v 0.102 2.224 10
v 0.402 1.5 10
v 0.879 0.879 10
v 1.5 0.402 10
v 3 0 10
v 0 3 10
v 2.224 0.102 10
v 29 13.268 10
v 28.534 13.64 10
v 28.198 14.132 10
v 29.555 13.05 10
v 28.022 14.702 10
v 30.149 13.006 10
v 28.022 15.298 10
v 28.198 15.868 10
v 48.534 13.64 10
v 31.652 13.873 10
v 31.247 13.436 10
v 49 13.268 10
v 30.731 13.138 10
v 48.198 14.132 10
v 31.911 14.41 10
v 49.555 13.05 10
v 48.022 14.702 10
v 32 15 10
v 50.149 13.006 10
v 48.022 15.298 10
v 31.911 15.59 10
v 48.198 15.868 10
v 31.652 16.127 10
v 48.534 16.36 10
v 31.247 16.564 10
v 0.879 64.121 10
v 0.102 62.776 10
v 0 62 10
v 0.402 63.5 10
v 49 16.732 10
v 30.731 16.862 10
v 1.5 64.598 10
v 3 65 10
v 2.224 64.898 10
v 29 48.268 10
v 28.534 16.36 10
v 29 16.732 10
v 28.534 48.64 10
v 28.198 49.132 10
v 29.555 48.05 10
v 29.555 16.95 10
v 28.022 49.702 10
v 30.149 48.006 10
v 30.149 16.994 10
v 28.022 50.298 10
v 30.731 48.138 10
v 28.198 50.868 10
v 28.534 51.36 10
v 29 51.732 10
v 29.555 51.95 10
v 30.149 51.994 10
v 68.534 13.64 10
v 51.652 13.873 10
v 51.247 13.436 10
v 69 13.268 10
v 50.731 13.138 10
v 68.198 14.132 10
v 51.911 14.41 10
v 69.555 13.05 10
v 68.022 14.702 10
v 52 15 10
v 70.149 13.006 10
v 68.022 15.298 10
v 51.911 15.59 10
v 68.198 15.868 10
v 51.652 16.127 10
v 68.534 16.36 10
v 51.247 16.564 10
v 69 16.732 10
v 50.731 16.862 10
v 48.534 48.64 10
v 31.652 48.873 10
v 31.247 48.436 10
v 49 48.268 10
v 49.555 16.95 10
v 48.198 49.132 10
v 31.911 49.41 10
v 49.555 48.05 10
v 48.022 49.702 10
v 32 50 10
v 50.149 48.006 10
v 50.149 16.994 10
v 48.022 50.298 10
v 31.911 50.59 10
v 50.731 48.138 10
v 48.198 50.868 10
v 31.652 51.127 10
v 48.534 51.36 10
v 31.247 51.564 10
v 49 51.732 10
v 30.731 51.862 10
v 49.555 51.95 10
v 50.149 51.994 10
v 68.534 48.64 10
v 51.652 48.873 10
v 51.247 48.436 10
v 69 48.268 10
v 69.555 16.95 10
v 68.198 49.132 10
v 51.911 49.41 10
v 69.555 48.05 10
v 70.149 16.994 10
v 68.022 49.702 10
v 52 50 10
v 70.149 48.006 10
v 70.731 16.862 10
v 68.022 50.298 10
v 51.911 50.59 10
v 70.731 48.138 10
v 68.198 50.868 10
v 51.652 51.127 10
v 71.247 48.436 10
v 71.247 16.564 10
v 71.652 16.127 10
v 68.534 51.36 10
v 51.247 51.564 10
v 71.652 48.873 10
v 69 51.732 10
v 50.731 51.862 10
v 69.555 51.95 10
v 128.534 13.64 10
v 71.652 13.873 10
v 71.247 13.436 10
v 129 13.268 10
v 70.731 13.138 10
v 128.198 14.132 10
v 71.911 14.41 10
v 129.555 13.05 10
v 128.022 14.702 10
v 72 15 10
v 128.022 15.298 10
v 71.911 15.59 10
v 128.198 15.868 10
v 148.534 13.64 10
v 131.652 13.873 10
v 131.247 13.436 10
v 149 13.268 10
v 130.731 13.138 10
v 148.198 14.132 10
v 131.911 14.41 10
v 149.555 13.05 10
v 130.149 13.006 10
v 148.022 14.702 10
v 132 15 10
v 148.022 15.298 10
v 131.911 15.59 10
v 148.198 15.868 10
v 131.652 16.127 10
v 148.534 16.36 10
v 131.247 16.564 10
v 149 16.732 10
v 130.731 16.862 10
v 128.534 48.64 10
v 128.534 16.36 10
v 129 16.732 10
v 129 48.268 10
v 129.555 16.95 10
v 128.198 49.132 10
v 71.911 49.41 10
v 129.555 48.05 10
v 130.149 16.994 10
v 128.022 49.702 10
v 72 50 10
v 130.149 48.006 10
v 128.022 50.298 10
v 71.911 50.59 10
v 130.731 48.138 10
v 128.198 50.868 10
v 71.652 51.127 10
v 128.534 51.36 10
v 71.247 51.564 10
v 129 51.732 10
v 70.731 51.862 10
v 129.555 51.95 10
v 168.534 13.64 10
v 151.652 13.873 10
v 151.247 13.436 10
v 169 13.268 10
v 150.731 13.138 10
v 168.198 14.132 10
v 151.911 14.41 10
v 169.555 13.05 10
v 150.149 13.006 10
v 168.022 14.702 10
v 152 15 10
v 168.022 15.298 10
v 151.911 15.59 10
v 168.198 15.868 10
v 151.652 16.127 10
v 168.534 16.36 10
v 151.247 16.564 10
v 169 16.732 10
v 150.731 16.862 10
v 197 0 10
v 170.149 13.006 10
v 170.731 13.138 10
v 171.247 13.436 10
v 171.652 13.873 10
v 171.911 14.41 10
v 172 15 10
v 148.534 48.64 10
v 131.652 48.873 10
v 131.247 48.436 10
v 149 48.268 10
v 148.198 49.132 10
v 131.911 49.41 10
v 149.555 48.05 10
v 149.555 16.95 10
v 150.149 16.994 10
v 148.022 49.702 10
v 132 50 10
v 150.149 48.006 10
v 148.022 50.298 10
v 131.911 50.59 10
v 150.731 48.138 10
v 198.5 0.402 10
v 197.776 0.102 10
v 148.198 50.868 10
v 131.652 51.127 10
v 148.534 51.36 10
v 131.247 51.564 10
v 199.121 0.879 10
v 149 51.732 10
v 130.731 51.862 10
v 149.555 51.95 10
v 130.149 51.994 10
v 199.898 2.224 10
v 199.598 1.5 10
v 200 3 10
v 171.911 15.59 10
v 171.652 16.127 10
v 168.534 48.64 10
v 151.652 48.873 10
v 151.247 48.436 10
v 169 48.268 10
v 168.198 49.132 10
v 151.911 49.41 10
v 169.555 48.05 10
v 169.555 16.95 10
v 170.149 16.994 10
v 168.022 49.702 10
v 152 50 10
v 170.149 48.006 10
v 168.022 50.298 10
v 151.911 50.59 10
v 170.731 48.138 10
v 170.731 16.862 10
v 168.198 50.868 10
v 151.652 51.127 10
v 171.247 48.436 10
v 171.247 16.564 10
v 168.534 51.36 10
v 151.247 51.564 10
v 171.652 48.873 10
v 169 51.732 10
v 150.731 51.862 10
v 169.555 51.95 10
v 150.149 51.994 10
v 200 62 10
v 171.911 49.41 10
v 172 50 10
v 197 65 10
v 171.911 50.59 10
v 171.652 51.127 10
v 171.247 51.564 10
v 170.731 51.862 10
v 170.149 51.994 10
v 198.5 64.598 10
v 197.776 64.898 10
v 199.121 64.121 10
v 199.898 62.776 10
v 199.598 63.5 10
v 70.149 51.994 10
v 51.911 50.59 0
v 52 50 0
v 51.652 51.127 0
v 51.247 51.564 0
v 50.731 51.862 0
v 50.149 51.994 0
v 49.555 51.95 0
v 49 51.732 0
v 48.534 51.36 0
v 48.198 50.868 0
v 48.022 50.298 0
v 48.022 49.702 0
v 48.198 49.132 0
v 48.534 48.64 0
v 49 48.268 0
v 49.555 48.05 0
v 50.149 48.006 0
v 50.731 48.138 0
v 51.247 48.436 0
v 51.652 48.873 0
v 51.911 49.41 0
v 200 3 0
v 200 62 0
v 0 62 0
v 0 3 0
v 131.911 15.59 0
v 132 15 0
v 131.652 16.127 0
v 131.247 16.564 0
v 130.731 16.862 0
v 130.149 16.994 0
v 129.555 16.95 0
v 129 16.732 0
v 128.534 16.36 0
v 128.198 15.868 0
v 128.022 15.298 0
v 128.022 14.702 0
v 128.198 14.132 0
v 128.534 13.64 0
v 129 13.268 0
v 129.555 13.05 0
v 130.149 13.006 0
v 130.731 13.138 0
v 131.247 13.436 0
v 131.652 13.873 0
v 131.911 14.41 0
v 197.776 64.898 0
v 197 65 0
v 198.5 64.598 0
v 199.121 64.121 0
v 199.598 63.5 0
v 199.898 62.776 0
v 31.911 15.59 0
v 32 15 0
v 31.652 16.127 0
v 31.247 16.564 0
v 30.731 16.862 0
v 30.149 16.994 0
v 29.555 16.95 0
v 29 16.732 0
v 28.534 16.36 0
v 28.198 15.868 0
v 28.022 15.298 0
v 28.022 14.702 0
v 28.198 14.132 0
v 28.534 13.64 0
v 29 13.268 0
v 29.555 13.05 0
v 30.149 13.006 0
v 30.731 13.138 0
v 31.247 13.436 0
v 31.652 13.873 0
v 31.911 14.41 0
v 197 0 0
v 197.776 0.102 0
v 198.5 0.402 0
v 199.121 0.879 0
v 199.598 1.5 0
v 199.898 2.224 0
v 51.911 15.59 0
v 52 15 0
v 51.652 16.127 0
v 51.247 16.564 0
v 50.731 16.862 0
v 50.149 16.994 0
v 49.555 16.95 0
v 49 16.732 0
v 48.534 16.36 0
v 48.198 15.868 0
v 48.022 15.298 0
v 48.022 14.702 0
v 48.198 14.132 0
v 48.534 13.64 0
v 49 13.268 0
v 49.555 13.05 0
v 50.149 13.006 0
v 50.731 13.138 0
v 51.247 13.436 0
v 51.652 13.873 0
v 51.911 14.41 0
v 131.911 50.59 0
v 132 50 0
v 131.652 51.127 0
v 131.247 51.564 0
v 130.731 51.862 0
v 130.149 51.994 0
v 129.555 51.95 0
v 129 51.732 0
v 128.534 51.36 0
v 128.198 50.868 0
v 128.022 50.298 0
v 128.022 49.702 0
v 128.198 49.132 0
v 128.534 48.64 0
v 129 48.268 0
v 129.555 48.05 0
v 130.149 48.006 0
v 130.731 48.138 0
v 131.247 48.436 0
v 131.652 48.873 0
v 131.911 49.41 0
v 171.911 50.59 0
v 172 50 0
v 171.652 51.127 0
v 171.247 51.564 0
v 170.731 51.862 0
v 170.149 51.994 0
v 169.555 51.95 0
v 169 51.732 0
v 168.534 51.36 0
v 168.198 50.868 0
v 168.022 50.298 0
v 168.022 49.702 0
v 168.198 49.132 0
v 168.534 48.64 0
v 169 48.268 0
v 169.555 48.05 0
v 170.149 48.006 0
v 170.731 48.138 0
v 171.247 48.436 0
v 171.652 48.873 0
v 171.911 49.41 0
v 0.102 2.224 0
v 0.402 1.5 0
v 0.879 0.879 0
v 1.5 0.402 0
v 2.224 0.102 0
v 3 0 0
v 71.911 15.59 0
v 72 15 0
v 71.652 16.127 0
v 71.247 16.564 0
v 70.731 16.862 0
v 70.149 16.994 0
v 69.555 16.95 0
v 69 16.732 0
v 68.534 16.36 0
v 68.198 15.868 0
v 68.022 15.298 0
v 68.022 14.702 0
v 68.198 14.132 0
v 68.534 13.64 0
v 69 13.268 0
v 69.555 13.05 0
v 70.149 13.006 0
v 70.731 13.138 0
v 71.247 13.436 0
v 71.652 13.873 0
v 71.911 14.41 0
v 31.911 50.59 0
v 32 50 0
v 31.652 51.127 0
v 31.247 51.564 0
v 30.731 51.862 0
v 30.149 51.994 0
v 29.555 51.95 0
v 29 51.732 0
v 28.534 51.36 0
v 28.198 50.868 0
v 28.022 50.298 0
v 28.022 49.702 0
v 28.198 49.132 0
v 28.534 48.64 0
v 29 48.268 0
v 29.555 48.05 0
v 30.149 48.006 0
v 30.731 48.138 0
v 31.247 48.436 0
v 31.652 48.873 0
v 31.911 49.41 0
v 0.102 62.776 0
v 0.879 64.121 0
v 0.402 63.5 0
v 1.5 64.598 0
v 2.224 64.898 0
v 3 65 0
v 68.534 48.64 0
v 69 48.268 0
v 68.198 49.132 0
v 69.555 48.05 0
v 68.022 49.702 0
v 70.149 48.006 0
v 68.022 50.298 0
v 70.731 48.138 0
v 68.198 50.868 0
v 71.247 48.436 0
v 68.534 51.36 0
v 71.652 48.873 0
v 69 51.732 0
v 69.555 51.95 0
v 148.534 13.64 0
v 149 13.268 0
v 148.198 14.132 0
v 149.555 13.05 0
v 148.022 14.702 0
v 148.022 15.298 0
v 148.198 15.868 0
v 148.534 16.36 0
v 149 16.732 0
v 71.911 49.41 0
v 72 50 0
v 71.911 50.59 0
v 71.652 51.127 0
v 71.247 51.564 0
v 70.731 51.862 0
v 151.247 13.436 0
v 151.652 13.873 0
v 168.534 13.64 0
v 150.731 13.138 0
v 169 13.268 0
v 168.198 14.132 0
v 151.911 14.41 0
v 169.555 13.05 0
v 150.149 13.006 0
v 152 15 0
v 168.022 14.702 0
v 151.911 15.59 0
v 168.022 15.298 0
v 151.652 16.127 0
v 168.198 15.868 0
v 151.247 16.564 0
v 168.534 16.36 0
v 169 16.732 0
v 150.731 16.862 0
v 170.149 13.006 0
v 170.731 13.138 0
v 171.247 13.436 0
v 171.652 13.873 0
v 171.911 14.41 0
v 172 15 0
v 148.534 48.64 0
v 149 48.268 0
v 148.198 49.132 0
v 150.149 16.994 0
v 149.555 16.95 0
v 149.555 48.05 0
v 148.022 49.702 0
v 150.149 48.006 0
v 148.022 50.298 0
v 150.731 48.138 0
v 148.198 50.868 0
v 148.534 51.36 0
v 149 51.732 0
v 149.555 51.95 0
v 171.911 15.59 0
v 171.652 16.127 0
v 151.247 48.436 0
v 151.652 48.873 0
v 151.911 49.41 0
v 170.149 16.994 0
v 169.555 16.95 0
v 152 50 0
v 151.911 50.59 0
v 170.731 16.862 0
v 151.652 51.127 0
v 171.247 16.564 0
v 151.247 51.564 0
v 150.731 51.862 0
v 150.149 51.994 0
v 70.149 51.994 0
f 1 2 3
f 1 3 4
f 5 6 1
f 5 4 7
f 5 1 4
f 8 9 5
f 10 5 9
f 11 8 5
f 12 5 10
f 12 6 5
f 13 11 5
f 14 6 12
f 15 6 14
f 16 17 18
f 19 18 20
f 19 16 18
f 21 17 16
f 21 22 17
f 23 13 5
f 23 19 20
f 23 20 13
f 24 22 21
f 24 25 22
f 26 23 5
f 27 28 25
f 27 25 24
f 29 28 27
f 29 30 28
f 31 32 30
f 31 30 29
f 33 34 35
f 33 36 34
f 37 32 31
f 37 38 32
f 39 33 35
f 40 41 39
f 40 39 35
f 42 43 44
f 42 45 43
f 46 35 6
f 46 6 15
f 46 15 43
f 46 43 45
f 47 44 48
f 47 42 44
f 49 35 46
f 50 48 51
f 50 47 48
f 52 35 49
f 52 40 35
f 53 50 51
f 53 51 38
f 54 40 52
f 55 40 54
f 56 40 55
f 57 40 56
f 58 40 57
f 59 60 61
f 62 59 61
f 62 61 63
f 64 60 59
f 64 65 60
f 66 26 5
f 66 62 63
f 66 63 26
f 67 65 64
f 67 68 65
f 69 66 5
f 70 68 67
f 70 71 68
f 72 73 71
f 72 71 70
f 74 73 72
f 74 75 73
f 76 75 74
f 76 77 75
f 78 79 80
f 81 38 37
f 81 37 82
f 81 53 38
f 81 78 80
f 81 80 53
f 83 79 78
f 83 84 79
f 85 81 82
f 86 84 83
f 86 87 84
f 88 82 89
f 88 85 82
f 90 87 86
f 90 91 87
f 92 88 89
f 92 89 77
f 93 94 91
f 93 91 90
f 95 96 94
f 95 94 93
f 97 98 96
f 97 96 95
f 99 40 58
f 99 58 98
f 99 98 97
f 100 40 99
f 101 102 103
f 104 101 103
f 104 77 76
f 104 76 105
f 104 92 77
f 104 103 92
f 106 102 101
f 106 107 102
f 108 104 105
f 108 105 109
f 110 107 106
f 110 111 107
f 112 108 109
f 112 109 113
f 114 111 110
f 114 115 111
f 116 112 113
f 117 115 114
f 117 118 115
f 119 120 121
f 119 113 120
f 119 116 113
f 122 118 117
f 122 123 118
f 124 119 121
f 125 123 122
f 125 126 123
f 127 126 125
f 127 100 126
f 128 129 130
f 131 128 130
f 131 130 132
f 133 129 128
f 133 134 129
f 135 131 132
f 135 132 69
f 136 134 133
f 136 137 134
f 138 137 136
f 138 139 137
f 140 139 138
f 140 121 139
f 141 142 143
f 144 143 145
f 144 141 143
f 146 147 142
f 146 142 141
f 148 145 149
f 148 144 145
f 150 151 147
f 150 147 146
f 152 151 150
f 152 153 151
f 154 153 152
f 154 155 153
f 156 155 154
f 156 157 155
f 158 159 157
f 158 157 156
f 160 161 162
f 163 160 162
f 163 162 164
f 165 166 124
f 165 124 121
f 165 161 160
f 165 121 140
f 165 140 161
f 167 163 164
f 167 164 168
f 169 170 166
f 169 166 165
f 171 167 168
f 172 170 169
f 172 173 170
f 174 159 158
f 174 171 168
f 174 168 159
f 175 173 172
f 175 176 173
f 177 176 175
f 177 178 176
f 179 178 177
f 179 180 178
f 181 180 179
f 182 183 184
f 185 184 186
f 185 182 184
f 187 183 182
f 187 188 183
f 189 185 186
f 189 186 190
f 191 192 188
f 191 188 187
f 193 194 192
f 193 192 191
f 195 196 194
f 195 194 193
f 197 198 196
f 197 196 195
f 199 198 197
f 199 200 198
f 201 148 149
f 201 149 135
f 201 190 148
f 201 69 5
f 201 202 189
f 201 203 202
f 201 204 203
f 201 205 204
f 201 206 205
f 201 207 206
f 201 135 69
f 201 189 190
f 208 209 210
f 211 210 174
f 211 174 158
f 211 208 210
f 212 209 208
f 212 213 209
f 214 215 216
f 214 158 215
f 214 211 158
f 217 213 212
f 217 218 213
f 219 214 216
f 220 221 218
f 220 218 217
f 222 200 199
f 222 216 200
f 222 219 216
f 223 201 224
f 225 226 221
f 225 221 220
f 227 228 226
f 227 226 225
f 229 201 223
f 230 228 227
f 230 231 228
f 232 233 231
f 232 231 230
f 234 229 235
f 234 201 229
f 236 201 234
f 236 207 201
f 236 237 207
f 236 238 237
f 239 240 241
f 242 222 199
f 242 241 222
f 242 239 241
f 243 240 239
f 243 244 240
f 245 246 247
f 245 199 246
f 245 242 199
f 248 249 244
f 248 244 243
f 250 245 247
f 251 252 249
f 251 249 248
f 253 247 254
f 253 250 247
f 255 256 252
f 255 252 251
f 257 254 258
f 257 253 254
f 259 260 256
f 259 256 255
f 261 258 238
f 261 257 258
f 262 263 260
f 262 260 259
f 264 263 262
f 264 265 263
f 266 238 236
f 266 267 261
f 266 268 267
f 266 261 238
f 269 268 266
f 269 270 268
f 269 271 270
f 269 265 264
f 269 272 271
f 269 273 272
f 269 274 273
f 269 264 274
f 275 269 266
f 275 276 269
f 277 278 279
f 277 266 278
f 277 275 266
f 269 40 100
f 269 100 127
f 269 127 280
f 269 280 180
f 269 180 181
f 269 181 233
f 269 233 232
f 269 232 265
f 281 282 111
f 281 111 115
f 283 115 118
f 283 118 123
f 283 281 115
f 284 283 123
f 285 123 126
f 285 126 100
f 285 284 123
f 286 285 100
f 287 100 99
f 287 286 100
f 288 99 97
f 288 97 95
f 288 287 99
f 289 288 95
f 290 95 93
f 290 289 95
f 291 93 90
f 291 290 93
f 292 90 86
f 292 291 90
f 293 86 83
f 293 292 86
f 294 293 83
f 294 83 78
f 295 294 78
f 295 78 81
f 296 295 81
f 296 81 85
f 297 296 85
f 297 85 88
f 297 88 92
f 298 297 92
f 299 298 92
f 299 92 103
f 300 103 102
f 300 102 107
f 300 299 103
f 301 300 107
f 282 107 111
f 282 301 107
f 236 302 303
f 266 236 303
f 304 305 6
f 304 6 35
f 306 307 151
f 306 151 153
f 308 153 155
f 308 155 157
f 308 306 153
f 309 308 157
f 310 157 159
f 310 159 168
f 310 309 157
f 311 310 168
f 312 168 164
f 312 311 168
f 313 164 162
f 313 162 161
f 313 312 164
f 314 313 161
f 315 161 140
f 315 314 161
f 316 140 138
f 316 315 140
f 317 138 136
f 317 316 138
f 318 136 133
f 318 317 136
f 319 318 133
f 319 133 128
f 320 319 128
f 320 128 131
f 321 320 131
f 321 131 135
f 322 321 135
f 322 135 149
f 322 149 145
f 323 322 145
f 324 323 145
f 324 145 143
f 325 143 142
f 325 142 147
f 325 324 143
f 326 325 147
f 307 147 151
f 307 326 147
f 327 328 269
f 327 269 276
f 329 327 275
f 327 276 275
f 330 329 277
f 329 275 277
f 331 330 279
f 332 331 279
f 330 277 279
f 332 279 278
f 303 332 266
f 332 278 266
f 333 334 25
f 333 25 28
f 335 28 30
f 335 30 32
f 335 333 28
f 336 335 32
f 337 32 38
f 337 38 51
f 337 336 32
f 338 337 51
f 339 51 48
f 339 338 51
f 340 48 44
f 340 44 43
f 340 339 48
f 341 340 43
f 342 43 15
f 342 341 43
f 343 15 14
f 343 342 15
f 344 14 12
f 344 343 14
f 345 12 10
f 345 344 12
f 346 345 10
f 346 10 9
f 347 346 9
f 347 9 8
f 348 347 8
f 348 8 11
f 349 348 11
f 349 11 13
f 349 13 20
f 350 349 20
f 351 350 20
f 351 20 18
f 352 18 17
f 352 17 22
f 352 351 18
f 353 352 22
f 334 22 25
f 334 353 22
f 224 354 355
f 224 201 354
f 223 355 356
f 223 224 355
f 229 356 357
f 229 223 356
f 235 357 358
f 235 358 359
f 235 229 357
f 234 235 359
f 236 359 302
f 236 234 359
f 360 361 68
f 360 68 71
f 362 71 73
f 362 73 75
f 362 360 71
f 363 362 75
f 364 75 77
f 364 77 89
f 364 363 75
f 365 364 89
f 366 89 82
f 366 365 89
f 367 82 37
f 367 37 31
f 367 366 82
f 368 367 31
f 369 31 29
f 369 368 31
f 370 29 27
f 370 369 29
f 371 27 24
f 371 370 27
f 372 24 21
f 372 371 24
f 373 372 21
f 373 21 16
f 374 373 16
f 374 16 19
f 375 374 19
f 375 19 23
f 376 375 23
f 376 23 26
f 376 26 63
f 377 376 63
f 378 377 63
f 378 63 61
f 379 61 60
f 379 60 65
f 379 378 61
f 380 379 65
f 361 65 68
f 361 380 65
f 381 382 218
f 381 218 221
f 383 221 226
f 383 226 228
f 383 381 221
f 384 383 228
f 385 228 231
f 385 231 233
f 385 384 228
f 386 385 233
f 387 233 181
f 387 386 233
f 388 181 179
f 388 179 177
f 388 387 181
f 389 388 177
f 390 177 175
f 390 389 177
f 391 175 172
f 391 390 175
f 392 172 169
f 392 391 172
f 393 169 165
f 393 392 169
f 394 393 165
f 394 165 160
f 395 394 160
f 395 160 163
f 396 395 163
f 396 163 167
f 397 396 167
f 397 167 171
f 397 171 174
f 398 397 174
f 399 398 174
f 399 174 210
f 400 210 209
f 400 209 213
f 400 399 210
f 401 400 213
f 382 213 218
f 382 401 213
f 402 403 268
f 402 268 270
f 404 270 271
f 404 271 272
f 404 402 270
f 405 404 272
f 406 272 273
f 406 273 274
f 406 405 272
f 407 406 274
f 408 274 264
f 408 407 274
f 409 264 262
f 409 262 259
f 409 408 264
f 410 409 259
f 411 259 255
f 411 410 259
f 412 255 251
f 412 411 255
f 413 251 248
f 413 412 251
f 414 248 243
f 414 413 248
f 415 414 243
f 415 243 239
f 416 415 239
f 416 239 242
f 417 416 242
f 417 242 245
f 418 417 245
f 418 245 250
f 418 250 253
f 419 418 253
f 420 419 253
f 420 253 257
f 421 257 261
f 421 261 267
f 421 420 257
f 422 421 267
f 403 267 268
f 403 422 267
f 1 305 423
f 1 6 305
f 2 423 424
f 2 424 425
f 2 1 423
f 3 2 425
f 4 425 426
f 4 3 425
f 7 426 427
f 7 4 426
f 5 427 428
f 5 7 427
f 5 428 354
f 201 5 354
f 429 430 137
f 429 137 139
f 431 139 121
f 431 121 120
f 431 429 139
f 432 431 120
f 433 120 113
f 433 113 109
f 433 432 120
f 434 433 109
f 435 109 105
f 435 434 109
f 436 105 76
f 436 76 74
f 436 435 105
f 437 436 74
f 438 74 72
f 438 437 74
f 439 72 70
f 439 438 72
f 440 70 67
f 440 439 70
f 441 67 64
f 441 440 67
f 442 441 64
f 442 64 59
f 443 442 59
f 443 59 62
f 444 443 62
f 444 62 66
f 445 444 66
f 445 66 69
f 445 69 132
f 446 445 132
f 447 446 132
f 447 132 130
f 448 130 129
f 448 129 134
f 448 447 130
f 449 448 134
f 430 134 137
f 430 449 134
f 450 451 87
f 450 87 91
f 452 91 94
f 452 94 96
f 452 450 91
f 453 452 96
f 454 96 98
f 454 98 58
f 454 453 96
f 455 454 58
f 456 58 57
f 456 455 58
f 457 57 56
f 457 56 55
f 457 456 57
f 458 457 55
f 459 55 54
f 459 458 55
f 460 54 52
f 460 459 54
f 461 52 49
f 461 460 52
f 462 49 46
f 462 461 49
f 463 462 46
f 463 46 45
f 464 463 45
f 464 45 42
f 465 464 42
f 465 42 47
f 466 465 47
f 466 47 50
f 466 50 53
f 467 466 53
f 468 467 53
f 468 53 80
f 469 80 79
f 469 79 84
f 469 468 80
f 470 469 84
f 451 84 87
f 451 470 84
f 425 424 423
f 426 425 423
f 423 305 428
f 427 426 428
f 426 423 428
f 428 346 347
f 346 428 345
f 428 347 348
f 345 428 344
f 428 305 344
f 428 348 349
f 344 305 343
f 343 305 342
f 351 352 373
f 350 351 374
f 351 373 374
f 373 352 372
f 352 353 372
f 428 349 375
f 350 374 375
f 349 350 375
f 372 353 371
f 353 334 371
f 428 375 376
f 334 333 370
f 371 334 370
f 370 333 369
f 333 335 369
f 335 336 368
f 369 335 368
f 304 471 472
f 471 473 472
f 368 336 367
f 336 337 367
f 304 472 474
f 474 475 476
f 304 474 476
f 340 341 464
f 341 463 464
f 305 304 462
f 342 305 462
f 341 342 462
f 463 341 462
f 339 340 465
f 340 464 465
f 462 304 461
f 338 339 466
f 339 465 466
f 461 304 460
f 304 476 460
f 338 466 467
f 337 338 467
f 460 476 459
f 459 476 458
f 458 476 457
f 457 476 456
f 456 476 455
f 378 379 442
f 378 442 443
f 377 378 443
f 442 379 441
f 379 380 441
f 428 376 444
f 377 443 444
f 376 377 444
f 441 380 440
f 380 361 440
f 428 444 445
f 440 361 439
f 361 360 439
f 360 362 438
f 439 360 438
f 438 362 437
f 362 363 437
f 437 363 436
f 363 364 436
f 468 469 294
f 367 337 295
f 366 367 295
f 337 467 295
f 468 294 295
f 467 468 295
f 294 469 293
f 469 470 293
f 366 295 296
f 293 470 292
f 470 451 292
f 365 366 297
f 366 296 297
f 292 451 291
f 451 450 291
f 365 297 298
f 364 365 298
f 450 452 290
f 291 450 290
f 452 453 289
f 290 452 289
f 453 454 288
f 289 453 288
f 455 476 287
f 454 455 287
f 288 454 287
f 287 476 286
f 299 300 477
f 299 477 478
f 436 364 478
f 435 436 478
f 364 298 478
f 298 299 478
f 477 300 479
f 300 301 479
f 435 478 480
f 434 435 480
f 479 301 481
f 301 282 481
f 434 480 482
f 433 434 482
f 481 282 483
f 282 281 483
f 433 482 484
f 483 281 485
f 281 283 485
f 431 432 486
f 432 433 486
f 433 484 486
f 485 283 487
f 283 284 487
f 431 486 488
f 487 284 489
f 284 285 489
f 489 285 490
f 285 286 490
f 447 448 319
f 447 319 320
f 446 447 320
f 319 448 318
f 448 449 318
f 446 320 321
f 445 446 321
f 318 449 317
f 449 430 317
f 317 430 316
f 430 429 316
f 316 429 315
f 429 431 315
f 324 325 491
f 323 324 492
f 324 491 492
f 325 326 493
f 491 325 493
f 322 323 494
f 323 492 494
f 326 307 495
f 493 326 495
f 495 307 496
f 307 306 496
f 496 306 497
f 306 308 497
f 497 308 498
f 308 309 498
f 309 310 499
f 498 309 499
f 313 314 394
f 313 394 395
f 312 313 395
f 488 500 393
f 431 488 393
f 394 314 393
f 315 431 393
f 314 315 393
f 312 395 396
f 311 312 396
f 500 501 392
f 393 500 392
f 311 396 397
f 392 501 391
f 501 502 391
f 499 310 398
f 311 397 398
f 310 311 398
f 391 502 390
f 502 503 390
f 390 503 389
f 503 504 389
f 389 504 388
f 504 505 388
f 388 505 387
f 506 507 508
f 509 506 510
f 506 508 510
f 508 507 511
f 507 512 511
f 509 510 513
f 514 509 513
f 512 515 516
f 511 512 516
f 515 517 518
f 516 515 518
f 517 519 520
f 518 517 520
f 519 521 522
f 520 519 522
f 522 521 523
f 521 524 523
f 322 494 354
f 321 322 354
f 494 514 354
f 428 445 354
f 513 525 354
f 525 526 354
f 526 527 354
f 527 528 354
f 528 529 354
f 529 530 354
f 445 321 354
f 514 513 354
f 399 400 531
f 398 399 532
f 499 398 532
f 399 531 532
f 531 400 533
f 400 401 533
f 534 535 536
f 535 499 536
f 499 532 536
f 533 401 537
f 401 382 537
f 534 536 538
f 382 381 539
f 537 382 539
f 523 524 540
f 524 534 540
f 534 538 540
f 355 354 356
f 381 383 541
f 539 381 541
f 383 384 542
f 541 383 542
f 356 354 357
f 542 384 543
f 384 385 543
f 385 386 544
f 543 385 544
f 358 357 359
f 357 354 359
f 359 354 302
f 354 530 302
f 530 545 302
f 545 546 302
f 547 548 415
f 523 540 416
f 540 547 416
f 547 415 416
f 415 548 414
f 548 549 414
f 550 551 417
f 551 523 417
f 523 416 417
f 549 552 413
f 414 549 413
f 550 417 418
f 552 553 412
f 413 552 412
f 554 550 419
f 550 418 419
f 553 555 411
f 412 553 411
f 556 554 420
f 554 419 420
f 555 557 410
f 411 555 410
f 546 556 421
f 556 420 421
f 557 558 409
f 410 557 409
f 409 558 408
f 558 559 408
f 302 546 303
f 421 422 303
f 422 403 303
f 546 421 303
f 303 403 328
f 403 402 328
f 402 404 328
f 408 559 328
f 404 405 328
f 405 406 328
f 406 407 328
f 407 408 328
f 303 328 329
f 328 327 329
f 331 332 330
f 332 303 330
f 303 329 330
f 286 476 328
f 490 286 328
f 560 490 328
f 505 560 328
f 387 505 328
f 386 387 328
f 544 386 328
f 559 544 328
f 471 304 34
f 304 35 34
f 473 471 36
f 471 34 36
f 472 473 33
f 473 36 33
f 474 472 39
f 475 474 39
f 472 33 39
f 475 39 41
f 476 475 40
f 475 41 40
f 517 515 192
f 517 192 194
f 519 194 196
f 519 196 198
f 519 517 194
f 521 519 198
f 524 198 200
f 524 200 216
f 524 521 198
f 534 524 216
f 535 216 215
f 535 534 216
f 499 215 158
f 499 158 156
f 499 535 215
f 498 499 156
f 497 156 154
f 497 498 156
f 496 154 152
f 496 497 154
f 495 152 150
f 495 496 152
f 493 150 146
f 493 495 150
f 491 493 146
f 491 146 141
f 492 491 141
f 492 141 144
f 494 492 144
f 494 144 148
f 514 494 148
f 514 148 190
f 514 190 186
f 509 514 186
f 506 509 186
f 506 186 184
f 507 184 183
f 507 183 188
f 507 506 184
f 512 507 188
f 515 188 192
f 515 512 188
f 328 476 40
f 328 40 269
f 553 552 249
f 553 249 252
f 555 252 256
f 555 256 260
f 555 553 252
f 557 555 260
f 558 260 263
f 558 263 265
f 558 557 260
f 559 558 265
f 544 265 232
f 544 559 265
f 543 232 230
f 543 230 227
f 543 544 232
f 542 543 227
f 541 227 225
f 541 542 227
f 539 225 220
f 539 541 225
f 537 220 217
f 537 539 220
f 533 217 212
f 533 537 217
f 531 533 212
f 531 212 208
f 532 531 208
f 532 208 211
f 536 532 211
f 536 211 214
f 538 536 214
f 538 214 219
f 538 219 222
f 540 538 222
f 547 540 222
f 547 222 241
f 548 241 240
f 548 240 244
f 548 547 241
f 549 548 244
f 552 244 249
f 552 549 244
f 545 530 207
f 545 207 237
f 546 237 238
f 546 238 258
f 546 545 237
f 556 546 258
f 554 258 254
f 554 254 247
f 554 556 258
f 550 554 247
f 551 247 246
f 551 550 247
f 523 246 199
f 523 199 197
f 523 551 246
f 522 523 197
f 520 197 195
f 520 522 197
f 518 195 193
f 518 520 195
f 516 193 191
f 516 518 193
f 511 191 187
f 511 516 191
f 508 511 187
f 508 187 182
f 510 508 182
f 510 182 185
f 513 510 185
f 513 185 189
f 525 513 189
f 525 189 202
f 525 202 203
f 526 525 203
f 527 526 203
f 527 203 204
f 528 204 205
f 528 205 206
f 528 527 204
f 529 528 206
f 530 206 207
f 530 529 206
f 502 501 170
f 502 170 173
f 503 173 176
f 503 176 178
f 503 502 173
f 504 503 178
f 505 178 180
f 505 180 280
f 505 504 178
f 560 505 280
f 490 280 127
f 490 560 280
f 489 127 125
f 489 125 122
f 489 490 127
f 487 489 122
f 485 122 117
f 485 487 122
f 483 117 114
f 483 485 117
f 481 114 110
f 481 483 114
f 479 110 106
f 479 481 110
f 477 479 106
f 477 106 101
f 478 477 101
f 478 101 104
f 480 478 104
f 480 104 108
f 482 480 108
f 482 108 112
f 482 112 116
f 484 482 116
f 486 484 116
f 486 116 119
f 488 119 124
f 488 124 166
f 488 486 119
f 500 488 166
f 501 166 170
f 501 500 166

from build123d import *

# Parameters (mm, degrees)
SKETCH_W  = 200
SKETCH_H  = 65
SKETCH_R  = 2
PAD_DEPTH = 10
FILLET_R  = 3


with BuildPart() as part:
    # Sketch → Pad (new body)
    with BuildSketch(Plane.XY):
        with Locations((100, 32.5)):
            Rectangle(SKETCH_W, SKETCH_H)
        with Locations((30, 50)):
            Circle(SKETCH_R, mode=Mode.SUBTRACT)
        with Locations((30, 15)):
            Circle(SKETCH_R, mode=Mode.SUBTRACT)
        with Locations((170, 50)):
            Circle(SKETCH_R, mode=Mode.SUBTRACT)
        with Locations((170, 15)):
            Circle(SKETCH_R, mode=Mode.SUBTRACT)
        with Locations((50, 50)):
            Circle(SKETCH_R, mode=Mode.SUBTRACT)
        with Locations((50, 15)):
            Circle(SKETCH_R, mode=Mode.SUBTRACT)
        with Locations((150, 50)):
            Circle(SKETCH_R, mode=Mode.SUBTRACT)
        with Locations((150, 15)):
            Circle(SKETCH_R, mode=Mode.SUBTRACT)
        with Locations((70, 50)):
            Circle(SKETCH_R, mode=Mode.SUBTRACT)
        with Locations((70, 15)):
            Circle(SKETCH_R, mode=Mode.SUBTRACT)
        with Locations((130, 15)):
            Circle(SKETCH_R, mode=Mode.SUBTRACT)
        with Locations((130, 50)):
            Circle(SKETCH_R, mode=Mode.SUBTRACT)
    extrude(amount=PAD_DEPTH)

    # Fillet
    fillet_edges = [part.edges().sort_by_distance(p)[0] for p in [
        (200, 0, 5),
        (0, 0, 5),
        (200, 65, 5),
        (0, 65, 5),
    ]]
    fillet(fillet_edges, radius=FILLET_R)


solid = part.part
